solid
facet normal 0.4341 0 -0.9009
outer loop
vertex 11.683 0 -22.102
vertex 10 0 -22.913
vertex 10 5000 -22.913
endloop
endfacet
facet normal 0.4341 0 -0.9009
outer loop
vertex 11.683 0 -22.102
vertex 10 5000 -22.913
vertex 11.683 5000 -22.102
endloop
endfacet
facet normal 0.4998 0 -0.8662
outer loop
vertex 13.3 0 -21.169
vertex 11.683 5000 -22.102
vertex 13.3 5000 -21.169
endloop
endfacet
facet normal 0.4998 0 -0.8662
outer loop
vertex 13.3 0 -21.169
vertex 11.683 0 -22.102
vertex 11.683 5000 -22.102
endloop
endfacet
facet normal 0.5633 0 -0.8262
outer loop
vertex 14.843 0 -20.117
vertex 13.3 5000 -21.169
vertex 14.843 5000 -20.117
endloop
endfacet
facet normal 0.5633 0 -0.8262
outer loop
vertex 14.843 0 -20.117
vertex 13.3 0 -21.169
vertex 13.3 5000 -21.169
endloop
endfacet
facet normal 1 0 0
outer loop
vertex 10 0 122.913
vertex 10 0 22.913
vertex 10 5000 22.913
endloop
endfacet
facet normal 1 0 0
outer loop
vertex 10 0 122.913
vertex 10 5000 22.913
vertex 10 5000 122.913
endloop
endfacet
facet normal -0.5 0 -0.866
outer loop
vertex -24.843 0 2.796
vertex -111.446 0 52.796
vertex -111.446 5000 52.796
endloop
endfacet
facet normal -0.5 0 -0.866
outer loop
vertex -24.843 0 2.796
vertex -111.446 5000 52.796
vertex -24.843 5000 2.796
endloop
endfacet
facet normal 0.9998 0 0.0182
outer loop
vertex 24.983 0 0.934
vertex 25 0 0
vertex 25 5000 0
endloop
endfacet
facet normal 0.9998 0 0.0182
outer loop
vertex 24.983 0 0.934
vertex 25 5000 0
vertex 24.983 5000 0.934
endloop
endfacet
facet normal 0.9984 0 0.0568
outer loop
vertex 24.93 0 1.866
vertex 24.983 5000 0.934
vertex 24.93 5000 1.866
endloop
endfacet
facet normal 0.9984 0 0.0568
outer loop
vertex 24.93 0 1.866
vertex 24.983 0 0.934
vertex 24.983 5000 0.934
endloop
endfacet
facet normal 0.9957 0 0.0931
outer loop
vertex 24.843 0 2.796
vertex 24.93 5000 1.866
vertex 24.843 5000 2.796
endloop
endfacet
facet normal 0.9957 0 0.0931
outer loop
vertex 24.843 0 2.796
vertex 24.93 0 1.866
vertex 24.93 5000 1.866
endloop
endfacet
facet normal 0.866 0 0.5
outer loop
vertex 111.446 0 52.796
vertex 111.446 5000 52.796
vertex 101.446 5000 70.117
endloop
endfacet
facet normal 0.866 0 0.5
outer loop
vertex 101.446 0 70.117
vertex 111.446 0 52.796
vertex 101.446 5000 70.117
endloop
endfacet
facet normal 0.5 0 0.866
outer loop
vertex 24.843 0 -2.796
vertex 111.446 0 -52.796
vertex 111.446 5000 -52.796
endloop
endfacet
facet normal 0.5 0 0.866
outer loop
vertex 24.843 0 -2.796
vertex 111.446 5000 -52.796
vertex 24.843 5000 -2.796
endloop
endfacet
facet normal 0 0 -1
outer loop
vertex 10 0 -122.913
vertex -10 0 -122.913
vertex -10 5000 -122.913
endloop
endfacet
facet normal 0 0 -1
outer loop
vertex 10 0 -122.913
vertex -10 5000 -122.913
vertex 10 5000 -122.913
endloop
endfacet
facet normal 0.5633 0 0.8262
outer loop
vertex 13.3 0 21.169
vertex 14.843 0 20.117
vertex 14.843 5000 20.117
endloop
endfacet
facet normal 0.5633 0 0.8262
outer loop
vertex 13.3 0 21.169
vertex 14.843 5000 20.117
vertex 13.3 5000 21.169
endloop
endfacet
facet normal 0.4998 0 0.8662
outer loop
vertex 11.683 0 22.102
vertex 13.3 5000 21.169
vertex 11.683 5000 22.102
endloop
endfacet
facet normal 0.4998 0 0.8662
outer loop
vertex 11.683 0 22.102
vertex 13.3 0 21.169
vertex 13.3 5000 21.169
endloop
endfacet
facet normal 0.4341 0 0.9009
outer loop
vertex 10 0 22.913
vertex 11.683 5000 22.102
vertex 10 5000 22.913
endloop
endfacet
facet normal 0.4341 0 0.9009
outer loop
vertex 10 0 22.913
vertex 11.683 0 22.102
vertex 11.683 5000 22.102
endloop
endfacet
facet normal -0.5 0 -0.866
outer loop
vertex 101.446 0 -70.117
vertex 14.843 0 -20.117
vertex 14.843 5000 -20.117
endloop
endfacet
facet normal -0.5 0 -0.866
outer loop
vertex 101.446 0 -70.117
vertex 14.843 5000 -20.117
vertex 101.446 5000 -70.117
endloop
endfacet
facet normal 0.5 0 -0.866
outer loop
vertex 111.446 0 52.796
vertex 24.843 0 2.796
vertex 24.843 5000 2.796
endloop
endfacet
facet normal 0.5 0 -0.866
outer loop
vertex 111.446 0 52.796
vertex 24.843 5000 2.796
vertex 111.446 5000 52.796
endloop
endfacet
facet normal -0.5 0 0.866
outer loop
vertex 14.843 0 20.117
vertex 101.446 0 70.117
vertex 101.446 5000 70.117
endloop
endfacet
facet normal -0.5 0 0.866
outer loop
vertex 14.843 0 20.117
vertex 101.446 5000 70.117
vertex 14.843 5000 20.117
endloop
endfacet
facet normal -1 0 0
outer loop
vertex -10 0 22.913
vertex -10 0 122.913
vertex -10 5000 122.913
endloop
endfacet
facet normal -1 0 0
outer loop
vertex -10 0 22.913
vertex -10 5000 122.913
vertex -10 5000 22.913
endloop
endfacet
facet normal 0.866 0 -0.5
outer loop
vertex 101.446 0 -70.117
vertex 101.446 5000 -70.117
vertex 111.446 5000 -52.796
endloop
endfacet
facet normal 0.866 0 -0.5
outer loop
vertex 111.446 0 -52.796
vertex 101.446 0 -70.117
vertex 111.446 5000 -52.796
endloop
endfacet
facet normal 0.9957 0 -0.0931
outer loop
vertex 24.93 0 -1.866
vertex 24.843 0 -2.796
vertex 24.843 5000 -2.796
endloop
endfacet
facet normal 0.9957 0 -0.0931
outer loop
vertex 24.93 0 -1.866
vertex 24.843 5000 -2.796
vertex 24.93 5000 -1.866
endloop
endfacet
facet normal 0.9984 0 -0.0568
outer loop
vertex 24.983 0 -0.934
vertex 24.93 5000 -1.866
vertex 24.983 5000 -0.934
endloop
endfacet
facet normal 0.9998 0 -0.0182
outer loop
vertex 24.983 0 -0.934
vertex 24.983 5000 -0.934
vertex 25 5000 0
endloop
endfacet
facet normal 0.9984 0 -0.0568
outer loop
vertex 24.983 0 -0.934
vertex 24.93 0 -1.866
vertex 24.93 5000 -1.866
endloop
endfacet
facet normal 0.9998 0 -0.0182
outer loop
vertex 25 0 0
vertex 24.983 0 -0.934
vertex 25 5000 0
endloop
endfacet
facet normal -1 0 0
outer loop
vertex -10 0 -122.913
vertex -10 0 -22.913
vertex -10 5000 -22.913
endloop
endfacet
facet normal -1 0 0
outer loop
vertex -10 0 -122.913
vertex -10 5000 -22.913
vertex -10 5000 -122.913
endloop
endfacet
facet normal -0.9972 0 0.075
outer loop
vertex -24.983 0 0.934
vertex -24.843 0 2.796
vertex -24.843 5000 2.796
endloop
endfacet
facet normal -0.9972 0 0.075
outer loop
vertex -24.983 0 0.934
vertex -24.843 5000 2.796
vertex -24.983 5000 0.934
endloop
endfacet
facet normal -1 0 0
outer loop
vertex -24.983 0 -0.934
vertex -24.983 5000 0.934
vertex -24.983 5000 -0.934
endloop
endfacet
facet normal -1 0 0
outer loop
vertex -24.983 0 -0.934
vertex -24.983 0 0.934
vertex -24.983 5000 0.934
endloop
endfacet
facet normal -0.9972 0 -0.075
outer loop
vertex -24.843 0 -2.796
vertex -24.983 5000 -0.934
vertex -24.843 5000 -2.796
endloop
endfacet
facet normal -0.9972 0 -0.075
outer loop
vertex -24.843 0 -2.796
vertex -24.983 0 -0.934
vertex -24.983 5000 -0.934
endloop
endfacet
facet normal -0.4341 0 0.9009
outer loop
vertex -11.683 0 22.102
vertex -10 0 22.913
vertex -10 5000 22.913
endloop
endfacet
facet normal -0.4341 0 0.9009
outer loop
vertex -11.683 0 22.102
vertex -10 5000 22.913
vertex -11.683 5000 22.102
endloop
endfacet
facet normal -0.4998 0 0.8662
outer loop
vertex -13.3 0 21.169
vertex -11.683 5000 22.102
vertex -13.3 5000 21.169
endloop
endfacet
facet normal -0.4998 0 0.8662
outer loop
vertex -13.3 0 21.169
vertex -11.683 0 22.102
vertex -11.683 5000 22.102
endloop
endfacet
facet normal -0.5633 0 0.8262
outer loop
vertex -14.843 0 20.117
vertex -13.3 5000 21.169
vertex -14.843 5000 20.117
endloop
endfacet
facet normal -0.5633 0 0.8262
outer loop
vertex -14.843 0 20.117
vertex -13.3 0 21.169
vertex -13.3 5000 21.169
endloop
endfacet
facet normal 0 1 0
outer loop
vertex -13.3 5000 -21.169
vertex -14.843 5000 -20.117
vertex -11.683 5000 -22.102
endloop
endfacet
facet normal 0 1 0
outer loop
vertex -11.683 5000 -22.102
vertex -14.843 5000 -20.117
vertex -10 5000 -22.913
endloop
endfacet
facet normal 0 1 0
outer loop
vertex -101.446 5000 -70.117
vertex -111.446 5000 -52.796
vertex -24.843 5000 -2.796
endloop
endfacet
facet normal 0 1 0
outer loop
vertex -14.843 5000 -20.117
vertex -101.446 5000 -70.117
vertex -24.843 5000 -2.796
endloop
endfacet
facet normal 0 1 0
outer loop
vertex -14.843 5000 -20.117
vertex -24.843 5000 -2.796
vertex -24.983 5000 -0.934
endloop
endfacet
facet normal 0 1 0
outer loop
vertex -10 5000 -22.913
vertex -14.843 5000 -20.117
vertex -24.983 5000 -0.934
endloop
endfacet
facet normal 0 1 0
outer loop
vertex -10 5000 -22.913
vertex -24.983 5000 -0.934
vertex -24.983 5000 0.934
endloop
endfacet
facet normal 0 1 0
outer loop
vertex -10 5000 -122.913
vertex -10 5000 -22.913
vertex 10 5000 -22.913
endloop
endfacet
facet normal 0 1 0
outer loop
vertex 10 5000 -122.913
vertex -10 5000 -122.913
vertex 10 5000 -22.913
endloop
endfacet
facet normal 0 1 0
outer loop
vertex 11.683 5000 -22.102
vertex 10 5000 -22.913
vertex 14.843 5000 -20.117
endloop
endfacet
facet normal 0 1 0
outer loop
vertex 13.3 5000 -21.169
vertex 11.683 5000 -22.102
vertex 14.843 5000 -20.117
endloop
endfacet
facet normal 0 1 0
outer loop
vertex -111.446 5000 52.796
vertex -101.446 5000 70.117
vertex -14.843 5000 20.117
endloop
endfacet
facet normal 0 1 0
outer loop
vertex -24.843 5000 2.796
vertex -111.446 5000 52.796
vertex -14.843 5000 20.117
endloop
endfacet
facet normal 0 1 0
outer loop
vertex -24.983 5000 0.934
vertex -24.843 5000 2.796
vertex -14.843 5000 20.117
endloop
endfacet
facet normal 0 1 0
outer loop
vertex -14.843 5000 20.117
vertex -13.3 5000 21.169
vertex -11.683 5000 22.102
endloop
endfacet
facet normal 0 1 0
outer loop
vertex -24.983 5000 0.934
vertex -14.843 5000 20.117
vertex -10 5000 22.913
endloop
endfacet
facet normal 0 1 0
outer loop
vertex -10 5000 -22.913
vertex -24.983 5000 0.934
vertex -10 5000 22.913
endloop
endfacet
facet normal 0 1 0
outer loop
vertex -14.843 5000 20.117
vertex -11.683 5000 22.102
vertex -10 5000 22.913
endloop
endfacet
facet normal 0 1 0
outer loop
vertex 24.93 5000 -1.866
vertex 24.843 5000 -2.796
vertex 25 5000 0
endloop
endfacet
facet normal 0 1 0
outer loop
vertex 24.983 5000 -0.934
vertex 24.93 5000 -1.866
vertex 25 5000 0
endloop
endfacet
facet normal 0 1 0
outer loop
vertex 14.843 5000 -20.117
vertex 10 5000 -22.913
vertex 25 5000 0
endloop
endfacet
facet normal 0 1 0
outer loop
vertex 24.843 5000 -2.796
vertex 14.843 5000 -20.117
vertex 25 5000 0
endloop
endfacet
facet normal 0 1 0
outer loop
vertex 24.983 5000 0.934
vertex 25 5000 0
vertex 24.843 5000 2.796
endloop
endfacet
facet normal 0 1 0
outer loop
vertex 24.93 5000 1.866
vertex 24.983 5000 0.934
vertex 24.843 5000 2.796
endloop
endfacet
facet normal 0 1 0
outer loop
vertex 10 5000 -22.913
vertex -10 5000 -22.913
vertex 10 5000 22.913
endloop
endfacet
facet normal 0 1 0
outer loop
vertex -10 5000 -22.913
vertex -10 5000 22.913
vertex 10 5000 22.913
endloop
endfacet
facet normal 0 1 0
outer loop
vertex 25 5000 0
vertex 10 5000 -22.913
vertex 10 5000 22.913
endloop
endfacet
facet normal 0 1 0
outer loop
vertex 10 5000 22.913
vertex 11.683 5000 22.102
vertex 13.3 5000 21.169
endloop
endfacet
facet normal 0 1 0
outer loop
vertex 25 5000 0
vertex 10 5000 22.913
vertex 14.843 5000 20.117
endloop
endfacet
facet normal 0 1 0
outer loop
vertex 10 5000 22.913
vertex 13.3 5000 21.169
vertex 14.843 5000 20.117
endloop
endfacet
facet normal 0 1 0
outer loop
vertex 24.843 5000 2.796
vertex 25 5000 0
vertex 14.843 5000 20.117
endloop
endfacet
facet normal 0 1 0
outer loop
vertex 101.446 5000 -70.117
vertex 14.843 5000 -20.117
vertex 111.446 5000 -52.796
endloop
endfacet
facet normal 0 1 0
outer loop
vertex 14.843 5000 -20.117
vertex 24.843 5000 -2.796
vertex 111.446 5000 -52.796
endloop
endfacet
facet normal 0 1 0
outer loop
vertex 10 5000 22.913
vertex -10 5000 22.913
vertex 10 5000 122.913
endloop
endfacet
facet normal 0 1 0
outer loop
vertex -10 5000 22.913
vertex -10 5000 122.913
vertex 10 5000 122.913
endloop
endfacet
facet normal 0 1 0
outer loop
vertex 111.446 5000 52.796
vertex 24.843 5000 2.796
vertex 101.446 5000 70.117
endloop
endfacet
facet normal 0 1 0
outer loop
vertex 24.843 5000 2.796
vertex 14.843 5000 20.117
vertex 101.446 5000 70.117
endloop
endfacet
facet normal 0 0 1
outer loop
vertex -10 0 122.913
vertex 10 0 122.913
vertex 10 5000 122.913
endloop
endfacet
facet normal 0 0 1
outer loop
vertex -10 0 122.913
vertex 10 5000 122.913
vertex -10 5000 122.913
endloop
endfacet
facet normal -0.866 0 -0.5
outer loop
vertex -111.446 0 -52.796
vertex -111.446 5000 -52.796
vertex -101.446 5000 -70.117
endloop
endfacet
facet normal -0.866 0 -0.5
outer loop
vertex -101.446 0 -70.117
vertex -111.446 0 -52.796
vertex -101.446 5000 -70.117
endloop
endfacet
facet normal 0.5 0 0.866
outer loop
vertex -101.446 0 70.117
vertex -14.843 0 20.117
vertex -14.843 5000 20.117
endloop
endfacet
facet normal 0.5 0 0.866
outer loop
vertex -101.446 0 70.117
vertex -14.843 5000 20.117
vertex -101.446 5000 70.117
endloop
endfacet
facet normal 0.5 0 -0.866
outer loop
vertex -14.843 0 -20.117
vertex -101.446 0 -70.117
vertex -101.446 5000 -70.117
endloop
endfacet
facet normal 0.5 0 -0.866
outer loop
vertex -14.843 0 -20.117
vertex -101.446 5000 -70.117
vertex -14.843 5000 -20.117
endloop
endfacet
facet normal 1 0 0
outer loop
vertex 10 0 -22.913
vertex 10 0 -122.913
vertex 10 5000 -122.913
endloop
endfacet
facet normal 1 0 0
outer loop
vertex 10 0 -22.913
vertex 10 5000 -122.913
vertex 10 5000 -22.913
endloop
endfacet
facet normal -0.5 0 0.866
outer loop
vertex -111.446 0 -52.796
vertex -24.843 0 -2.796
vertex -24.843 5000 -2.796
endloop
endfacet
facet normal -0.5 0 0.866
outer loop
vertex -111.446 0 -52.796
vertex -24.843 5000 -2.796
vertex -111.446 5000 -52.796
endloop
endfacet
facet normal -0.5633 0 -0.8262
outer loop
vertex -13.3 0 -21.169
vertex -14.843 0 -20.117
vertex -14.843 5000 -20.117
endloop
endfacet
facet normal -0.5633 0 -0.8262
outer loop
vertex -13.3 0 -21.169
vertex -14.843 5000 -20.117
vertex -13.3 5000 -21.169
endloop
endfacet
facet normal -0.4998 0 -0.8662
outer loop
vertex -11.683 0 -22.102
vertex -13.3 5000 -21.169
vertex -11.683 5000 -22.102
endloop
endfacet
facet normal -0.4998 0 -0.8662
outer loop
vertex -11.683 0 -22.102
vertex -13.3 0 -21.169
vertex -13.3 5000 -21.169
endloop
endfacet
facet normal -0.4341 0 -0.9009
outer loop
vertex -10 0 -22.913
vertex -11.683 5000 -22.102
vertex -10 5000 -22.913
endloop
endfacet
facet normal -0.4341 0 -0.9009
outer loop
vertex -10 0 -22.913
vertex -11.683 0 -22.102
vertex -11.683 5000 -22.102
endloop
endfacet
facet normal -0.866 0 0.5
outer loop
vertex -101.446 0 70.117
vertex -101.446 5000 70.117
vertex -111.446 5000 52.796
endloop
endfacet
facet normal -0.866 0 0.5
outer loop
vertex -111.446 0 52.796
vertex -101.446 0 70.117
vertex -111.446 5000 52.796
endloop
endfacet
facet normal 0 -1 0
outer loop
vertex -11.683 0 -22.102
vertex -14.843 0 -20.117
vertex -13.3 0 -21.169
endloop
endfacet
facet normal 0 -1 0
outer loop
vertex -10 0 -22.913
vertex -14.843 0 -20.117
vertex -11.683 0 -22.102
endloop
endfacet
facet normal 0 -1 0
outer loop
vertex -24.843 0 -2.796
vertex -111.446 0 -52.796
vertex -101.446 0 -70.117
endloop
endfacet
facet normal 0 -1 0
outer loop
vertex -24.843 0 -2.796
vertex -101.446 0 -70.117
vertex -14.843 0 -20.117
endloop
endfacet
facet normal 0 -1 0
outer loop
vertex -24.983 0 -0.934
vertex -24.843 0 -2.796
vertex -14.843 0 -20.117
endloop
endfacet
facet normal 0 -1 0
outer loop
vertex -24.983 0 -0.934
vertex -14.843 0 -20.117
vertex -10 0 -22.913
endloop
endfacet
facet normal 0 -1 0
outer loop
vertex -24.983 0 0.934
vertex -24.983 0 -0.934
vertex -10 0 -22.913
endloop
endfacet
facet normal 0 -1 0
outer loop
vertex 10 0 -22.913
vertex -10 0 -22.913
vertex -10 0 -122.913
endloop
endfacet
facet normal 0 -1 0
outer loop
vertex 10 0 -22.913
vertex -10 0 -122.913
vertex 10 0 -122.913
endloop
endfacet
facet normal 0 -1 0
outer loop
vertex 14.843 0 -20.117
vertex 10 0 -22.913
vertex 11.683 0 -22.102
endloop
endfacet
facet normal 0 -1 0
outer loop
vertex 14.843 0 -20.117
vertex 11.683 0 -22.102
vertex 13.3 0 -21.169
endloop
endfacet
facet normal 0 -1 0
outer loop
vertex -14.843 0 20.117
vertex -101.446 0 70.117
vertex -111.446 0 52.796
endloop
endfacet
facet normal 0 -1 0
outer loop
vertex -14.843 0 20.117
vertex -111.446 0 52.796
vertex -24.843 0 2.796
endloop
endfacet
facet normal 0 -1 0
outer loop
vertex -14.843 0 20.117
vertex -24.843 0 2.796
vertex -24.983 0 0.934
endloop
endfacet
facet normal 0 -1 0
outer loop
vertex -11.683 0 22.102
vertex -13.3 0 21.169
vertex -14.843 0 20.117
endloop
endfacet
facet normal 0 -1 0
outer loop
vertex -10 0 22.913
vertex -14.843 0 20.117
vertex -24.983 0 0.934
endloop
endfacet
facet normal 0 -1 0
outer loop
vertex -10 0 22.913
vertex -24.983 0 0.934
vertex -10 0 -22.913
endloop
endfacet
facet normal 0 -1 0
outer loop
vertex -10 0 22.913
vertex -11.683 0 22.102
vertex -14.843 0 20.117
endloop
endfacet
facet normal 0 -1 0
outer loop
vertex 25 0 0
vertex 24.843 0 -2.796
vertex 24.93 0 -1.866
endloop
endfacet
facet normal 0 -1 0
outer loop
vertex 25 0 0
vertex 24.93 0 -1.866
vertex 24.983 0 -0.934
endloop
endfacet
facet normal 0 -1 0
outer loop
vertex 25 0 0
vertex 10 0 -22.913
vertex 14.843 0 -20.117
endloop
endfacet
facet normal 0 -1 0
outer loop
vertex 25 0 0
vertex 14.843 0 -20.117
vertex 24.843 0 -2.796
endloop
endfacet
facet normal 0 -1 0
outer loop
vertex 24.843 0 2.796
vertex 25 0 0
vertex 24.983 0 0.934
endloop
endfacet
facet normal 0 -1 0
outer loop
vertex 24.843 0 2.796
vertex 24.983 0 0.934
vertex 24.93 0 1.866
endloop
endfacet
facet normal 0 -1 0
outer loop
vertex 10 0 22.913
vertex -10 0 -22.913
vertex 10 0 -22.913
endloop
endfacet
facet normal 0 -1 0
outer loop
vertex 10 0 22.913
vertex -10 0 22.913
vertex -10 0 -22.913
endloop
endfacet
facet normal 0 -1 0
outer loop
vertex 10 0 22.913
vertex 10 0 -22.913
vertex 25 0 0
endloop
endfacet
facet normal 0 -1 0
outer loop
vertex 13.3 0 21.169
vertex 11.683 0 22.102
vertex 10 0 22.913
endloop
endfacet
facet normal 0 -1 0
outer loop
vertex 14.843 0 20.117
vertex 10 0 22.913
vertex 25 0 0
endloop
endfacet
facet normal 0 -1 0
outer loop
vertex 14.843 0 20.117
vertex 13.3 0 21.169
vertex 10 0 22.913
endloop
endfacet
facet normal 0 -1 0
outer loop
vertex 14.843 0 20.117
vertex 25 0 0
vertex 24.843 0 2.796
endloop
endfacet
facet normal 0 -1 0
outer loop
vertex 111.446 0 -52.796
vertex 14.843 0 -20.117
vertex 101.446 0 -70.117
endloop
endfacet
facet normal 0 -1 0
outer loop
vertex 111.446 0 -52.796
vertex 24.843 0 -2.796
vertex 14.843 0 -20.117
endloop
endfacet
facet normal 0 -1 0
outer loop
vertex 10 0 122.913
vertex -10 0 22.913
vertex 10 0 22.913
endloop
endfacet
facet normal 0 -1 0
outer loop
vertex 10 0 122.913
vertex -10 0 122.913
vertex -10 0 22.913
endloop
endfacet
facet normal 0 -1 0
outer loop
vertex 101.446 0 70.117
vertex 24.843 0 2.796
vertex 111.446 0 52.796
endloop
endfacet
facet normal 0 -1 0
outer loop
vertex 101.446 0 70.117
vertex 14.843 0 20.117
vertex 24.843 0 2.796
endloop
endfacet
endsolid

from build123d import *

# Parameters (mm, degrees)
F1_DEPTH = 5000


with BuildPart() as f1:
    # F0 (on Front) → F1 (new body)
    with BuildSketch(Plane.XZ):
        with BuildLine():
            ThreePointArc((14.843135, 20.116693), (21.650635, 12.5), (24.843135, 2.796185))
            Line((24.843135, 2.796185), (111.445675, 52.796185))
            Line((111.445675, 52.796185), (106.445675, 61.456439))
            Line((106.445675, 61.456439), (101.445675, 70.116693))
            Line((101.445675, 70.116693), (14.843135, 20.116693))
        make_face()
        with BuildLine():
            Line((111.445675, -52.796185), (24.843135, -2.796185))
            ThreePointArc((24.843135, -2.796185), (21.650635, -12.5), (14.843135, -20.116693))
            Line((14.843135, -20.116693), (101.445675, -70.116693))
            Line((101.445675, -70.116693), (106.445675, -61.456439))
            Line((106.445675, -61.456439), (111.445675, -52.796185))
        make_face()
        with BuildLine():
            Line((10, -122.912878), (10, -22.912878))
            ThreePointArc((10, -22.912878), (0, -25), (-10, -22.912878))
            Line((-10, -22.912878), (-10, -122.912878))
            Line((-10, -122.912878), (0, -122.912878))
            Line((0, -122.912878), (10, -122.912878))
        make_face()
        with BuildLine():
            ThreePointArc((24.843135, -2.796185), (24.960753, -1.400291), (25, 0))
            ThreePointArc((25, 0), (24.960753, 1.400291), (24.843135, 2.796185))
            ThreePointArc((24.843135, 2.796185), (21.650635, 12.5), (14.843135, 20.116693))
            ThreePointArc((14.843135, 20.116693), (12.5, 21.650635), (10, 22.912878))
            ThreePointArc((10, 22.912878), (0, 25), (-10, 22.912878))
            ThreePointArc((-10, 22.912878), (-12.5, 21.650635), (-14.843135, 20.116693))
            ThreePointArc((-14.843135, 20.116693), (-21.650635, 12.5), (-24.843135, 2.796185))
            ThreePointArc((-24.843135, 2.796185), (-25, 0), (-24.843135, -2.796185))
            ThreePointArc((-24.843135, -2.796185), (-21.650635, -12.5), (-14.843135, -20.116693))
            ThreePointArc((-14.843135, -20.116693), (-12.5, -21.650635), (-10, -22.912878))
            ThreePointArc((-10, -22.912878), (0, -25), (10, -22.912878))
            ThreePointArc((10, -22.912878), (12.5, -21.650635), (14.843135, -20.116693))
            ThreePointArc((14.843135, -20.116693), (21.650635, -12.5), (24.843135, -2.796185))
        make_face()
        with BuildLine():
            Line((-101.445675, -70.116693), (-14.843135, -20.116693))
            ThreePointArc((-14.843135, -20.116693), (-21.650635, -12.5), (-24.843135, -2.796185))
            Line((-24.843135, -2.796185), (-111.445675, -52.796185))
            Line((-111.445675, -52.796185), (-106.445675, -61.456439))
            Line((-106.445675, -61.456439), (-101.445675, -70.116693))
        make_face()
        with BuildLine():
            ThreePointArc((-24.843135, 2.796185), (-21.650635, 12.5), (-14.843135, 20.116693))
            Line((-14.843135, 20.116693), (-101.445675, 70.116693))
            Line((-101.445675, 70.116693), (-106.445675, 61.456439))
            Line((-106.445675, 61.456439), (-111.445675, 52.796185))
            Line((-111.445675, 52.796185), (-24.843135, 2.796185))
        make_face()
        with BuildLine():
            ThreePointArc((-10, 22.912878), (0, 25), (10, 22.912878))
            Line((10, 22.912878), (10, 122.912878))
            Line((10, 122.912878), (0, 122.912878))
            Line((0, 122.912878), (-10, 122.912878))
            Line((-10, 122.912878), (-10, 22.912878))
        make_face()
    extrude(amount=-F1_DEPTH)


solid = f1.part
